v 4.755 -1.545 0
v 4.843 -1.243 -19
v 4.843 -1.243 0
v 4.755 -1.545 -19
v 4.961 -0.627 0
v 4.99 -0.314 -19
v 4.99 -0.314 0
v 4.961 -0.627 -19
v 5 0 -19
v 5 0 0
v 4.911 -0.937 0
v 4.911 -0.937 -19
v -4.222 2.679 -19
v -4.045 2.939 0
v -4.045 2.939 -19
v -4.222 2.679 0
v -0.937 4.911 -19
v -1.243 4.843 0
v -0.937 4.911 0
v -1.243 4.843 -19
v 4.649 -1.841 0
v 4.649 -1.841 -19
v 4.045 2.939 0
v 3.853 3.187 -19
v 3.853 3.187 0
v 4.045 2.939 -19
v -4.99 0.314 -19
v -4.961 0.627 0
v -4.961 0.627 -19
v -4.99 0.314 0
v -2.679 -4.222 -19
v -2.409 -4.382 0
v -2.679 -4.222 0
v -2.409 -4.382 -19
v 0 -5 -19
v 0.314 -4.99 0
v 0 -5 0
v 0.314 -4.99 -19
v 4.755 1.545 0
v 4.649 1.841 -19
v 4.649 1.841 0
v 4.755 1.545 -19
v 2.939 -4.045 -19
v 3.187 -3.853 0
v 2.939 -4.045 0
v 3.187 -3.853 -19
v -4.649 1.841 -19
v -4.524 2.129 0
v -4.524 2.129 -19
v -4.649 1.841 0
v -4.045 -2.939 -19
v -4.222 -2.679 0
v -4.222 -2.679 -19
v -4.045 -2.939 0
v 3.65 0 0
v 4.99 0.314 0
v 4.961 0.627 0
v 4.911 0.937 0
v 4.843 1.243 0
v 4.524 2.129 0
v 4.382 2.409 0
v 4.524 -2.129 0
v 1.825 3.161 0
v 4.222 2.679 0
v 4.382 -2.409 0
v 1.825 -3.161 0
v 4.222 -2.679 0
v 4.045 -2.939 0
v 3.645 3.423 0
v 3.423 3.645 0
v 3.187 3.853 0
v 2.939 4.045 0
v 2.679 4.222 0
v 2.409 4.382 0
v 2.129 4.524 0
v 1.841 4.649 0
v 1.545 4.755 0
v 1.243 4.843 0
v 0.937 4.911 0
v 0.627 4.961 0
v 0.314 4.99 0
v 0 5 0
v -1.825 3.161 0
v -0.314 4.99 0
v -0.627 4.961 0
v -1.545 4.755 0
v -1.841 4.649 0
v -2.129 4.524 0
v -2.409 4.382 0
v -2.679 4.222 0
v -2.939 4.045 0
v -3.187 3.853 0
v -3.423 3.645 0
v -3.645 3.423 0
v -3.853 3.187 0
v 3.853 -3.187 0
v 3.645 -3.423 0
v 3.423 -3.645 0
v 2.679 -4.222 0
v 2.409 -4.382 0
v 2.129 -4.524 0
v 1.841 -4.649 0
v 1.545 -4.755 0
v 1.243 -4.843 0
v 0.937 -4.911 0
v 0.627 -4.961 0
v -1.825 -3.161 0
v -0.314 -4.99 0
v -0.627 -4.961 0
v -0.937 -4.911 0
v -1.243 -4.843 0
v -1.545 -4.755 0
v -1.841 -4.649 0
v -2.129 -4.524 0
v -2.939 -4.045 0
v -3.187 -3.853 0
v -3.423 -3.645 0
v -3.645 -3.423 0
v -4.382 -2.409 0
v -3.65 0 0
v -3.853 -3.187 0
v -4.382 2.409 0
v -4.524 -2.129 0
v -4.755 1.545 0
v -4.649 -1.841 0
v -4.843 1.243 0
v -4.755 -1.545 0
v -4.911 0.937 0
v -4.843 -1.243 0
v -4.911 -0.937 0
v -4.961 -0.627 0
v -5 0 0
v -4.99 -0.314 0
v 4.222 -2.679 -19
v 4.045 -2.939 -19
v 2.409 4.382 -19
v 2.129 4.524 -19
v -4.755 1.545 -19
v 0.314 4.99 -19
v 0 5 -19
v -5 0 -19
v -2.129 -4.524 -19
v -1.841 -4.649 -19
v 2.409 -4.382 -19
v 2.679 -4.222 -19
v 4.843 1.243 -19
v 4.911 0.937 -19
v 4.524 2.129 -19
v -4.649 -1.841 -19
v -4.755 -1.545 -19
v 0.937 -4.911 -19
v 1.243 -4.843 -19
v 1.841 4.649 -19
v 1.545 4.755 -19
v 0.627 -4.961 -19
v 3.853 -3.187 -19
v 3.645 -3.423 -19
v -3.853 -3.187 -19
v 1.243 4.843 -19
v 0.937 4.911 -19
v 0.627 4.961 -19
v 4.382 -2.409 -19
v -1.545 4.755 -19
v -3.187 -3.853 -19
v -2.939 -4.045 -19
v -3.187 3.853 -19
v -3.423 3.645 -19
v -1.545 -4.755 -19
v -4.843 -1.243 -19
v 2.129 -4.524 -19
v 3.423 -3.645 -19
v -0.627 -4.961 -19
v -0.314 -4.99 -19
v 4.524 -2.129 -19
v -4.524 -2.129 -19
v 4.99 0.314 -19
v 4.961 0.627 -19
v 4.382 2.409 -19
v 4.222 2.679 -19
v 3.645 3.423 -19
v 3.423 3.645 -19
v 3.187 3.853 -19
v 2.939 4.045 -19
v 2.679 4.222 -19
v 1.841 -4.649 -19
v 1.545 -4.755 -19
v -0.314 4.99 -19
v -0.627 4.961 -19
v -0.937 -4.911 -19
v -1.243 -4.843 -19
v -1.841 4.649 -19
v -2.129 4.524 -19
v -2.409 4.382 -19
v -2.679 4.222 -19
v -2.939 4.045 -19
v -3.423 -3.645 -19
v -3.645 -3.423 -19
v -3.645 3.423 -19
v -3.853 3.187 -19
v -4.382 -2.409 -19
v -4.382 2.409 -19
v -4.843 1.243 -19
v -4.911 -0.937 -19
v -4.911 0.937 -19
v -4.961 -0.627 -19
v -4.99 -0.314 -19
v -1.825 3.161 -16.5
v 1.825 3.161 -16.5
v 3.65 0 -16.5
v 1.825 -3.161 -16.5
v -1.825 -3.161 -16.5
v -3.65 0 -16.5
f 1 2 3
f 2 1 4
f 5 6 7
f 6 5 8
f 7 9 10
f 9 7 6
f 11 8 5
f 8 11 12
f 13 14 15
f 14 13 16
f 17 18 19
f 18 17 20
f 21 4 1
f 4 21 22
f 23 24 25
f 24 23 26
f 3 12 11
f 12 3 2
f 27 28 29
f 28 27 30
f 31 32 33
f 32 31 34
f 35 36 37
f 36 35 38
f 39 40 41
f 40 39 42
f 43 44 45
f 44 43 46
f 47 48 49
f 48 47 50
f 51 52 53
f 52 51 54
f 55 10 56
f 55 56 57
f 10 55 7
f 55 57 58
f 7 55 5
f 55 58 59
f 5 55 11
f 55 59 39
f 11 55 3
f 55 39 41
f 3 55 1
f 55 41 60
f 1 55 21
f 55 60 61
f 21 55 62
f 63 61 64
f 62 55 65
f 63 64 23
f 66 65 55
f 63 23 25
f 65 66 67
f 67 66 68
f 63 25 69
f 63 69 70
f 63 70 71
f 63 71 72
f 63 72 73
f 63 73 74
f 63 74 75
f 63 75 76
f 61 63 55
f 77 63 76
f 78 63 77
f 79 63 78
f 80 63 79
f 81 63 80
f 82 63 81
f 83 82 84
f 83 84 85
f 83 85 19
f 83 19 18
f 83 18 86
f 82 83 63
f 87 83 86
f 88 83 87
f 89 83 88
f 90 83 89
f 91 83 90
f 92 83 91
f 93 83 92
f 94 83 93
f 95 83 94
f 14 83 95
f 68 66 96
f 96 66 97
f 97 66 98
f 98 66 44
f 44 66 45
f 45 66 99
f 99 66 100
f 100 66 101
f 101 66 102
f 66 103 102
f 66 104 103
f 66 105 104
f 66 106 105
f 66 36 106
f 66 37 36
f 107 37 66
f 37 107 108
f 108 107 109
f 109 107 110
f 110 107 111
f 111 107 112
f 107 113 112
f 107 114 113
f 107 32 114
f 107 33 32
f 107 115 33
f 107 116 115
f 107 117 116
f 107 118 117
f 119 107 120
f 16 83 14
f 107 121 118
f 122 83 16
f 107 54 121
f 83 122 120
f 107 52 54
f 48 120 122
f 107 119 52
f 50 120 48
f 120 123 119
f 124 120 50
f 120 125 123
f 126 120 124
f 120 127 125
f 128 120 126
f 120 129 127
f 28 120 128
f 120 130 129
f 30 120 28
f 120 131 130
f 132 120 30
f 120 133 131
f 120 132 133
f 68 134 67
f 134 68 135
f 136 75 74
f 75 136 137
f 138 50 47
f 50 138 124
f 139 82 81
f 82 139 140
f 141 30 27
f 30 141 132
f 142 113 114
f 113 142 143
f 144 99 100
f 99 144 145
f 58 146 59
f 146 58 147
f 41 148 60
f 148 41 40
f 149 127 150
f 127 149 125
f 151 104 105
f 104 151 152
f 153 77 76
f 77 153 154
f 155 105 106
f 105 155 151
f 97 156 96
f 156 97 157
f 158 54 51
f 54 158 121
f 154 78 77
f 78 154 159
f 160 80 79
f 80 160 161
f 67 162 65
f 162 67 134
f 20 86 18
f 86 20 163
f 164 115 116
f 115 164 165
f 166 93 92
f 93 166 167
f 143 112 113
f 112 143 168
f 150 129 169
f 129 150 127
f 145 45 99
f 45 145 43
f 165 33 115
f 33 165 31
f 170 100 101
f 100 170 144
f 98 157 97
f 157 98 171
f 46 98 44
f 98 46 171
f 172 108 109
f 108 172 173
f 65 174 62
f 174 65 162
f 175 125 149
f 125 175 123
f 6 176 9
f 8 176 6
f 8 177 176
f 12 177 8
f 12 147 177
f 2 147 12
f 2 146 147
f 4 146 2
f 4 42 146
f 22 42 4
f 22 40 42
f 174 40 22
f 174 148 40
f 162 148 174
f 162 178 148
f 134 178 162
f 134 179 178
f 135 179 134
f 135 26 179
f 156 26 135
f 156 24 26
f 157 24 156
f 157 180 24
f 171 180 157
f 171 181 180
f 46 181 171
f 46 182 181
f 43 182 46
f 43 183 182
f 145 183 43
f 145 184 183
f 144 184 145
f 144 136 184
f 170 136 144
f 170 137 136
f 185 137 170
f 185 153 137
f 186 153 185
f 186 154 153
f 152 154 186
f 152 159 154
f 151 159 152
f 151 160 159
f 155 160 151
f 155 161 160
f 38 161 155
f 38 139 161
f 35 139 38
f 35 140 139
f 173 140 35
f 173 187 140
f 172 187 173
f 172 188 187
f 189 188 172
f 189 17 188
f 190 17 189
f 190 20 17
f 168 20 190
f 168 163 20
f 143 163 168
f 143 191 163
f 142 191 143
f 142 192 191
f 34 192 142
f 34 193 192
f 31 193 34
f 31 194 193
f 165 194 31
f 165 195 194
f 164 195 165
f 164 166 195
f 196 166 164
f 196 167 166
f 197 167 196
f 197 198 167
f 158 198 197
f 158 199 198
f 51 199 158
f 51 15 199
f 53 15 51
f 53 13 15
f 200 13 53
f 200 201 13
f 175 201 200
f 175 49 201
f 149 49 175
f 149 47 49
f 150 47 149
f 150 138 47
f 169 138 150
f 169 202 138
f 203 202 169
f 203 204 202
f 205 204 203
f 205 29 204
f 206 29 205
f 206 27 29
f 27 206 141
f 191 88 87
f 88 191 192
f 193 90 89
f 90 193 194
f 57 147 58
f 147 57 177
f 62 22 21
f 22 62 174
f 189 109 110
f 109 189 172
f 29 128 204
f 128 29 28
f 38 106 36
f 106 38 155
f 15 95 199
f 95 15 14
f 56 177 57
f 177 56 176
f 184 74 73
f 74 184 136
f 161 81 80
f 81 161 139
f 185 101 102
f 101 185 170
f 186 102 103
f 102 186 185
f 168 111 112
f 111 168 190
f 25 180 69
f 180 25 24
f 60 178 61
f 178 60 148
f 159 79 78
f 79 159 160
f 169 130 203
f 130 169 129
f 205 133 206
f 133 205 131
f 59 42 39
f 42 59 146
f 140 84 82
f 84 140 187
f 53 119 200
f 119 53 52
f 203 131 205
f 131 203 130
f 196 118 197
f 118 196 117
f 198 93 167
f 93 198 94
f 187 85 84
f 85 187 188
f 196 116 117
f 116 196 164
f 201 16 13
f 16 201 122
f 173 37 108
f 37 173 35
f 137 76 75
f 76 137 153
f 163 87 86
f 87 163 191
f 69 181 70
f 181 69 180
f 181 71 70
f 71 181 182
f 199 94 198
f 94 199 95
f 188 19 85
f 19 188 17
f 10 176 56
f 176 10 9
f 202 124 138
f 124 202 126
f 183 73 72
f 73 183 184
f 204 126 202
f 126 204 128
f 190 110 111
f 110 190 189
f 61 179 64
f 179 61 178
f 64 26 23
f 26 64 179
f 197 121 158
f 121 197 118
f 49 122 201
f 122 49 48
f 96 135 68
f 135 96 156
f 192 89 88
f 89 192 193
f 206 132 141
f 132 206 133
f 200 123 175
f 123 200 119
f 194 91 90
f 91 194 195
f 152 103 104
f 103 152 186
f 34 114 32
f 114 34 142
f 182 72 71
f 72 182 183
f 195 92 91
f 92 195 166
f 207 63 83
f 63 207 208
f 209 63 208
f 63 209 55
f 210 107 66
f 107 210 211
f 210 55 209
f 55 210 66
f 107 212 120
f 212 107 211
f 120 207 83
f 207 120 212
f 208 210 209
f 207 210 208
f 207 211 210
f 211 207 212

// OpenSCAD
// This is an insert for mounting hex tools in wood or other material.
//
// Warning -- some sanding and fitting may be required.
//
// This is licensed under the creative commons+attribution license
//
// To fulfill the attribution requirement, please link to:
// http://www.thingiverse.com/thing:3041630

/* [Main] */

// Define number of facets (large numbers provide better smoothing)
$fn=100;

shape=0;//[0:Without Knurling,1:With Knurling]

// in mm
insert_height = 19.0;

// in mm
hole_depth = 16.0;

// (without knurling) in mm
outside_diameter = 10.0;

// in mm
inside_diameter = 7.3;

module knurl1()
{
        for(i=[0:1:5])
        {
                translate([outside_diameter/2+insert_height/24,0,i*insert_height/6+insert_height/12])
        rotate([0,90,0]) cylinder(h=insert_height/12,r1=insert_height/12,r2=0,center=true,$fn=4);
        }
}
 
module knurl2()
{
    for(i=[0:1:4])
    {
     
        translate([outside_diameter/2+insert_height/24,0,i*insert_height/6+insert_height/6])
        rotate([0,90,0]) cylinder(h=insert_height/12,r1=insert_height/12,r2=0,center=true,$fn=4);
    }
}

rotate([180,0,0]) difference()
{
    if(shape==0)
    {
        // Draw outer shape
        translate([0,0,0]) cylinder(h=insert_height,r=outside_diameter/2,center=false);
    }
    if(shape==1)
    {
        union()
        {
                // Draw outer shape
                translate([0,0,0]) cylinder(h=insert_height,r=outside_diameter/2,center=false);

                // Draw small pyramids
                for(angle=[0:30:330]) 
                {
                        rotate([0,0,angle])    knurl1();
            rotate([0,0,angle+15]) knurl2();
                }

        }
    }
        
    #translate([0,0,hole_depth/2]) cylinder($fn=6,r=inside_diameter/2,h=hole_depth+1.0,center=true);
}
